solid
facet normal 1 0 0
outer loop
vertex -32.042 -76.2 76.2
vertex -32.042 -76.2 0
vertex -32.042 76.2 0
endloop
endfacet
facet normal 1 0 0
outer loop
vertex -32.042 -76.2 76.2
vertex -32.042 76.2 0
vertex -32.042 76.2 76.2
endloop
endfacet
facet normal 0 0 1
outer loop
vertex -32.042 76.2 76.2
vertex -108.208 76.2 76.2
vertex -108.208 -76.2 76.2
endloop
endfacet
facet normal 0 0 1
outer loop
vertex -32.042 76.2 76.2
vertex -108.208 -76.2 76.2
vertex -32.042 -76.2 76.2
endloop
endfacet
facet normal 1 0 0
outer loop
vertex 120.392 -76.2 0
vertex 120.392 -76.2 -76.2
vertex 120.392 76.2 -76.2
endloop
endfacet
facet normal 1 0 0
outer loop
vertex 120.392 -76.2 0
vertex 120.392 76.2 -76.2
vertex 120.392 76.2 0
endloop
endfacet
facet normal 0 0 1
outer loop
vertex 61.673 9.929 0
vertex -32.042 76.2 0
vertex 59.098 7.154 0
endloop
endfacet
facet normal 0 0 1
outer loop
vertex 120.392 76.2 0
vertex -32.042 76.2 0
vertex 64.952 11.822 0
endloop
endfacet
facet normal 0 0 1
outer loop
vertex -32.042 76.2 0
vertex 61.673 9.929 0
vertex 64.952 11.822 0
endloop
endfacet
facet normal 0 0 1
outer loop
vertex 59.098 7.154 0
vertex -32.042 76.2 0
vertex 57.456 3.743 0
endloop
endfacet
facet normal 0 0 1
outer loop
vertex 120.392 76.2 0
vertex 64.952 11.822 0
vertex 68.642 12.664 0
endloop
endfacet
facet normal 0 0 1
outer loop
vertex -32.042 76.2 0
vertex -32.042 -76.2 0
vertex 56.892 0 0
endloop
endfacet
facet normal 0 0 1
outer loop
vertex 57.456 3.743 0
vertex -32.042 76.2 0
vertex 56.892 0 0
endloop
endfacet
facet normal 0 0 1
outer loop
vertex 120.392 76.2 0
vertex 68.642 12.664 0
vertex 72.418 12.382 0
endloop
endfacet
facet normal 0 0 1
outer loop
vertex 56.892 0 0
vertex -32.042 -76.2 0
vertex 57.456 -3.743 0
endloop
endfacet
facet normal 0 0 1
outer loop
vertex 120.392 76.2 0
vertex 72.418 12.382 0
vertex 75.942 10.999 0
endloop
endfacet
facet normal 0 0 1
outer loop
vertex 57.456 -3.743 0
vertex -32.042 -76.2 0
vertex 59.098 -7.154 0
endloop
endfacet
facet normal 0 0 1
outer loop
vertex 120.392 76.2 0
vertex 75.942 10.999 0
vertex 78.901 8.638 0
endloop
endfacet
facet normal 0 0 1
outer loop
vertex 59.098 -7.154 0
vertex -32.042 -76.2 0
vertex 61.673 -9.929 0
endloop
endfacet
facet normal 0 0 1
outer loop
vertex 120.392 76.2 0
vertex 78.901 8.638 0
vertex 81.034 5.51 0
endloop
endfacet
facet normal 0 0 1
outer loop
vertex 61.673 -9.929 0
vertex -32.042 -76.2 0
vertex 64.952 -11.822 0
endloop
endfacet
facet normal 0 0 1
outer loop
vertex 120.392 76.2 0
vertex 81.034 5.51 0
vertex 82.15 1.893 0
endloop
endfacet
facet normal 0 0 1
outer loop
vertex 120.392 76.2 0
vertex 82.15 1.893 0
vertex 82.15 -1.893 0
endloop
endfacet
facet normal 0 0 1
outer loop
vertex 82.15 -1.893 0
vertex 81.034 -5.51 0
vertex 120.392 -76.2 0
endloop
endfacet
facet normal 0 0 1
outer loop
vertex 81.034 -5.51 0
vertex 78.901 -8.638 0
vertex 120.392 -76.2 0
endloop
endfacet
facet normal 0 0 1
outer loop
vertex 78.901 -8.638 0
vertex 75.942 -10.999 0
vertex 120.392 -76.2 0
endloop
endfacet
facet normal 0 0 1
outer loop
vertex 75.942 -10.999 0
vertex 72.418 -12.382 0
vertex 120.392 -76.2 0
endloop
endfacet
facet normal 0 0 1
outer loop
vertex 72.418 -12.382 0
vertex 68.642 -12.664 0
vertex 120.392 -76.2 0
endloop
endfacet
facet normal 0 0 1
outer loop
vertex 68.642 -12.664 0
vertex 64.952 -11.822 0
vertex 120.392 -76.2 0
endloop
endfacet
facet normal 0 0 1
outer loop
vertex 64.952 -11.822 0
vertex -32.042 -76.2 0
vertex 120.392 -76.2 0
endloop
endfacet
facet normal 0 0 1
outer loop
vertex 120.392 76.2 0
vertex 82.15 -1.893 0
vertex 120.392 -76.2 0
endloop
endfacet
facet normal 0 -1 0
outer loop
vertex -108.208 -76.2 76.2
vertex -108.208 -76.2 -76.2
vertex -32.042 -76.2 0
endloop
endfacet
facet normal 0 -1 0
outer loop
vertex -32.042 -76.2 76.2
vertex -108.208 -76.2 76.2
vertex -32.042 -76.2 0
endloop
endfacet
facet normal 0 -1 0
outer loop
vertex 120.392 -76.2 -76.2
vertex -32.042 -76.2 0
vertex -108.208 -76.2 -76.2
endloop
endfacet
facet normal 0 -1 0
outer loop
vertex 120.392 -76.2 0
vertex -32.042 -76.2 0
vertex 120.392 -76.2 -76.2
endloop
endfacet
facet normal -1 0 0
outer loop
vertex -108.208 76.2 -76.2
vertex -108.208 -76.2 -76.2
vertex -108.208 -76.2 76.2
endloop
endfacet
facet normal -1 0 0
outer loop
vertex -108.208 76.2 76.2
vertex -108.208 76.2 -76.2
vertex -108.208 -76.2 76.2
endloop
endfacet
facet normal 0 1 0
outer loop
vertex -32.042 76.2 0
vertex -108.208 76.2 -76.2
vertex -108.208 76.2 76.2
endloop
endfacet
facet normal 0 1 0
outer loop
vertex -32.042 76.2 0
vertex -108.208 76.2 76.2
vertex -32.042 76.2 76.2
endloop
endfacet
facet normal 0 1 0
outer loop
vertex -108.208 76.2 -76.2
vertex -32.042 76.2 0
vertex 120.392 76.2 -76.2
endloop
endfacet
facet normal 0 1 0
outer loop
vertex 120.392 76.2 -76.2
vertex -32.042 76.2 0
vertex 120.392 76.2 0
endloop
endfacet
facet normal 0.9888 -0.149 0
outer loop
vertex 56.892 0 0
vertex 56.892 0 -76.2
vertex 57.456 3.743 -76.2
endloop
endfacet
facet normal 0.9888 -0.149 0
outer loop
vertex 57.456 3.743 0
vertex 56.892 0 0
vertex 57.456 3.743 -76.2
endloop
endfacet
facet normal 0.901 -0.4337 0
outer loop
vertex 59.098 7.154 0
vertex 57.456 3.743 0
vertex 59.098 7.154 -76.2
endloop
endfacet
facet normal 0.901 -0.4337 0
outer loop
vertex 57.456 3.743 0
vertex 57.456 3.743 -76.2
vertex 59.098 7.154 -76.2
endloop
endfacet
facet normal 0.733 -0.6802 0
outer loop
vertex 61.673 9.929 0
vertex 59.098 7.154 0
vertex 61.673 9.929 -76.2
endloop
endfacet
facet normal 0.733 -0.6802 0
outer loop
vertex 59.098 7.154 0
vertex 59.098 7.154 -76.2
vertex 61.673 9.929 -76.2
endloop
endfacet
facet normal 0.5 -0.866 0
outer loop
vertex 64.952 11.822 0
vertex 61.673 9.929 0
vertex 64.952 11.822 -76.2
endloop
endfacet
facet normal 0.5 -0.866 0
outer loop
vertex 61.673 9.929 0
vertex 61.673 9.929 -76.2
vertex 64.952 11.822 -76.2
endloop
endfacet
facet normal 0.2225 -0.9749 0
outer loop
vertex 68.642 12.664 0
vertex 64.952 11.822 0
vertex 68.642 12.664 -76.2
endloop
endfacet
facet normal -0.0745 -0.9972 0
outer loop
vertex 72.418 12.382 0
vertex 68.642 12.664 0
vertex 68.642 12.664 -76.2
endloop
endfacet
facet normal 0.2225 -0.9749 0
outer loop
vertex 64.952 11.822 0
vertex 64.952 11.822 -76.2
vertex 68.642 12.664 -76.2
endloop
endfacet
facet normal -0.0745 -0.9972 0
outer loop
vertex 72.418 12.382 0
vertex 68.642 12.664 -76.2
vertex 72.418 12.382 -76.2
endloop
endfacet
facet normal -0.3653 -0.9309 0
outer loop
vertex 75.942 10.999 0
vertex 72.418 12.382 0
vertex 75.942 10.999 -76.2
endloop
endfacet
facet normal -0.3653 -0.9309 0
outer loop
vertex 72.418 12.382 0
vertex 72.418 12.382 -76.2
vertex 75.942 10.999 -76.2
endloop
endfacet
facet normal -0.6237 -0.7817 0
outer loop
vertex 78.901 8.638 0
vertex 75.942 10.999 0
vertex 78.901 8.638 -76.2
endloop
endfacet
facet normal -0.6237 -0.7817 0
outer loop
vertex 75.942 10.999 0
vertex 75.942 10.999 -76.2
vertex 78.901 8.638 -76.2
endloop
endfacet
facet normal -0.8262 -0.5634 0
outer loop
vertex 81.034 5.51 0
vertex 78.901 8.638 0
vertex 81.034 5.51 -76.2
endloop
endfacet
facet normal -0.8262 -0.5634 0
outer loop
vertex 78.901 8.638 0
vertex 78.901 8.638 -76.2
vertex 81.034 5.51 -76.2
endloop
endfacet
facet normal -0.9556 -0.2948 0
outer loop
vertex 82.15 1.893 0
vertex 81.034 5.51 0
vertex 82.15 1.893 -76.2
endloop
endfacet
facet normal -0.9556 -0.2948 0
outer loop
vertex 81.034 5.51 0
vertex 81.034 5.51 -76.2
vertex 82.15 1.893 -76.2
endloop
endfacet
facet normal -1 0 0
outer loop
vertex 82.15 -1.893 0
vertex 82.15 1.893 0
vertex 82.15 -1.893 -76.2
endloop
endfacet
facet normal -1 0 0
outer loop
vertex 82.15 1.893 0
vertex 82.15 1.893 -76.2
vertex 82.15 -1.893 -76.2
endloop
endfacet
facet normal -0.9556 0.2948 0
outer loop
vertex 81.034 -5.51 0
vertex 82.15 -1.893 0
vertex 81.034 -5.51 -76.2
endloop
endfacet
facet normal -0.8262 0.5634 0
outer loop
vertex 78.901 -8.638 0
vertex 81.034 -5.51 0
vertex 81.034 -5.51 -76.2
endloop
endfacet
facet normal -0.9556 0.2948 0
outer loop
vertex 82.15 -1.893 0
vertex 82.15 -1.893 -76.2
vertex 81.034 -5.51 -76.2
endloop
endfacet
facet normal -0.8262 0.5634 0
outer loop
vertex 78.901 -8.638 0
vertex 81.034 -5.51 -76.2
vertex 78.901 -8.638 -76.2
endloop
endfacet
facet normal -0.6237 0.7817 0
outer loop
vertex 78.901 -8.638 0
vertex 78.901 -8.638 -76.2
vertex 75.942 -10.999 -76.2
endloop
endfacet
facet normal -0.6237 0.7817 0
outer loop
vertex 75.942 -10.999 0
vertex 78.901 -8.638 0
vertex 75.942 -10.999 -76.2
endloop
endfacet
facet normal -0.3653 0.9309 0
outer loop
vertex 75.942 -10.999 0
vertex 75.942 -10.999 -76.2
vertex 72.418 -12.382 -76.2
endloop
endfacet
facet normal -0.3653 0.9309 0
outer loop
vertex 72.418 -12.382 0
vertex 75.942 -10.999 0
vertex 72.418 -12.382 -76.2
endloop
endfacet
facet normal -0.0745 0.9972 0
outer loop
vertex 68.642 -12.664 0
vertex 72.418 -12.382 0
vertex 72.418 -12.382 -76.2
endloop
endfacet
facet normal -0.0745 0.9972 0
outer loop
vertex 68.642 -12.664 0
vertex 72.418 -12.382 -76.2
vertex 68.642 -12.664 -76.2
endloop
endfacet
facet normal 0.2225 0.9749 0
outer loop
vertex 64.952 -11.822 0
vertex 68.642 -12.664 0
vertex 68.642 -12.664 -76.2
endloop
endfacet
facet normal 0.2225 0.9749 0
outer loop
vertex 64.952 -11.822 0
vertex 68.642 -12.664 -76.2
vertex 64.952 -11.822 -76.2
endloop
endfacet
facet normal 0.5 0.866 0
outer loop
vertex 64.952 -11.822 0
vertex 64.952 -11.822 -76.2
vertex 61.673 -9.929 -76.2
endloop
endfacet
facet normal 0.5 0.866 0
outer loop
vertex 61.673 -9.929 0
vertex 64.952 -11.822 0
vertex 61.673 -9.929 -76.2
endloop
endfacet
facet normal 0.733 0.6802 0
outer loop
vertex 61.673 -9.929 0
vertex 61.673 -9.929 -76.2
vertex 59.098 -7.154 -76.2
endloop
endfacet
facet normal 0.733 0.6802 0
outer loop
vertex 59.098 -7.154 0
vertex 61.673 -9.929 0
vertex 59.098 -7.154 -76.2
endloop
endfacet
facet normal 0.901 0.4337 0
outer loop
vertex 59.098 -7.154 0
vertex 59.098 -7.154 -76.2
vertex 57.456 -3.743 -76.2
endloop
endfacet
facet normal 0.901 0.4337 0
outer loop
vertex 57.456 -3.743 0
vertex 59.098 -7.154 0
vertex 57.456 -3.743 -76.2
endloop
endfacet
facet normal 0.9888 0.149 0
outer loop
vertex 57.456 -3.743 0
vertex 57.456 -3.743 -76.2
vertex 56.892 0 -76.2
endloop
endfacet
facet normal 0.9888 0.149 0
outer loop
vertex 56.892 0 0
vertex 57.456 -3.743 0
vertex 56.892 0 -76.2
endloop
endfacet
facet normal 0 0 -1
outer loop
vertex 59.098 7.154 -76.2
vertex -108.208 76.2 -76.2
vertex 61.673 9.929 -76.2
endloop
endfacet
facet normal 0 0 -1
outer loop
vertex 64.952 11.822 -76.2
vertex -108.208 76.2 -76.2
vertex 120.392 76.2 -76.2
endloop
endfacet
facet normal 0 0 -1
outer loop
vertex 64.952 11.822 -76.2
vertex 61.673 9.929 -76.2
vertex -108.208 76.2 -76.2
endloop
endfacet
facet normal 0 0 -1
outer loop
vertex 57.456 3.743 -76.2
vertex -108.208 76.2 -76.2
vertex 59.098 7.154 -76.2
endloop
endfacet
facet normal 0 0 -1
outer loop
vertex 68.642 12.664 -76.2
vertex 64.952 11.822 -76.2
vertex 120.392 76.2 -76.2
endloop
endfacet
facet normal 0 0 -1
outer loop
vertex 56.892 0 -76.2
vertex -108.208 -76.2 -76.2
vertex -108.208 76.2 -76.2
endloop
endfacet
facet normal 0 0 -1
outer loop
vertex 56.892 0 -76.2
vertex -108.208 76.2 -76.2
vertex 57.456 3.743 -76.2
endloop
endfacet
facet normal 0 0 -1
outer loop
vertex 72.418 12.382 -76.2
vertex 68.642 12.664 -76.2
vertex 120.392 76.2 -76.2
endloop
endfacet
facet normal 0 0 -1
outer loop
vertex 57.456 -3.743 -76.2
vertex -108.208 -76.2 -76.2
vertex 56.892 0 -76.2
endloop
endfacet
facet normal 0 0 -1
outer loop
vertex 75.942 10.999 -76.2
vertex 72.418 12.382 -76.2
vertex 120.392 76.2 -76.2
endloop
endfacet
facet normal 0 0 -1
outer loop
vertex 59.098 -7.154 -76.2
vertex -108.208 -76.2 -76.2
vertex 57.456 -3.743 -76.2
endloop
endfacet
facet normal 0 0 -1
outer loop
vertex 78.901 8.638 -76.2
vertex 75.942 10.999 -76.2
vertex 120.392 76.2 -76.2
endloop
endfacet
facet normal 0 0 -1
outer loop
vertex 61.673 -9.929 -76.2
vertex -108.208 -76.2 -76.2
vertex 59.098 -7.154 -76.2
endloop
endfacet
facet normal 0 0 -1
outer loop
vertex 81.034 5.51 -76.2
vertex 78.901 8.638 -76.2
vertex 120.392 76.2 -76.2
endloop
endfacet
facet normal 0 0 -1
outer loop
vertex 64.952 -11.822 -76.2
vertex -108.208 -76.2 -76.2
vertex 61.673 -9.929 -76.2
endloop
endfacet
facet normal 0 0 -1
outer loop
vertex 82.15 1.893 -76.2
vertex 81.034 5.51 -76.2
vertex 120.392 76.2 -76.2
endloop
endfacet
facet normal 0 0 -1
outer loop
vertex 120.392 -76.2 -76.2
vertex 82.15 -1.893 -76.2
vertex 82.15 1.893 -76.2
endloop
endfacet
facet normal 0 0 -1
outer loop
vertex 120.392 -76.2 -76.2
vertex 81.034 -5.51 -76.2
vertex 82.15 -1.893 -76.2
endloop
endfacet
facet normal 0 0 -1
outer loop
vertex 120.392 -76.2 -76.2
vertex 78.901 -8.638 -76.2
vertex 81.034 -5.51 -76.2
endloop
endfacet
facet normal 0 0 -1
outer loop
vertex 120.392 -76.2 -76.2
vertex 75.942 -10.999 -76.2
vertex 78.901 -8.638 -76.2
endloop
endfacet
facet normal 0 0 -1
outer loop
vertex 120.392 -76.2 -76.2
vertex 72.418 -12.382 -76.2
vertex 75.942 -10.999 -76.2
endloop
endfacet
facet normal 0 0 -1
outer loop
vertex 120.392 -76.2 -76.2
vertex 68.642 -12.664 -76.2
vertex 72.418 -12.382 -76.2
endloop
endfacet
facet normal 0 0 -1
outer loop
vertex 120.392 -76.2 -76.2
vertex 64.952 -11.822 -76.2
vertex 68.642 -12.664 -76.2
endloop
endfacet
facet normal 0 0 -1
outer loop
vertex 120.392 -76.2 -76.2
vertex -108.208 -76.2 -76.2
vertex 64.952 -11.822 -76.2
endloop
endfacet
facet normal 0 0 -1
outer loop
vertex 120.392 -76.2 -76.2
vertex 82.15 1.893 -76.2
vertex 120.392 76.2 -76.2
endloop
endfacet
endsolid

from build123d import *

# Parameters (mm, degrees)
F0_W     = 228.6
F0_H     = 152.4
F1_DEPTH = 76.2
F2_W     = 152.433592
F2_H     = 76.2
F3_DEPTH = 152.401
F5_D     = 25.4


with BuildPart() as f1:
    # F0 (on Front) → F1 (new body, symmetric)
    with BuildSketch(Plane.XZ):
        with Locations((6.091539, 0)):
            Rectangle(F0_W, F0_H)
    extrude(amount=F1_DEPTH, both=True)

    # F2 (on face) → F3 (cut, through all)
    with BuildSketch(Plane.XZ.offset(76.2)):
        with Locations((44.174743, 38.1)):
            Rectangle(F2_W, F2_H)
    extrude(amount=-F3_DEPTH, mode=Mode.SUBTRACT)

    # F5 (through all)
    with Locations(Plane.XY):
        with Locations((69.591539, 0)):
            Hole(F5_D / 2)


solid = f1.part
